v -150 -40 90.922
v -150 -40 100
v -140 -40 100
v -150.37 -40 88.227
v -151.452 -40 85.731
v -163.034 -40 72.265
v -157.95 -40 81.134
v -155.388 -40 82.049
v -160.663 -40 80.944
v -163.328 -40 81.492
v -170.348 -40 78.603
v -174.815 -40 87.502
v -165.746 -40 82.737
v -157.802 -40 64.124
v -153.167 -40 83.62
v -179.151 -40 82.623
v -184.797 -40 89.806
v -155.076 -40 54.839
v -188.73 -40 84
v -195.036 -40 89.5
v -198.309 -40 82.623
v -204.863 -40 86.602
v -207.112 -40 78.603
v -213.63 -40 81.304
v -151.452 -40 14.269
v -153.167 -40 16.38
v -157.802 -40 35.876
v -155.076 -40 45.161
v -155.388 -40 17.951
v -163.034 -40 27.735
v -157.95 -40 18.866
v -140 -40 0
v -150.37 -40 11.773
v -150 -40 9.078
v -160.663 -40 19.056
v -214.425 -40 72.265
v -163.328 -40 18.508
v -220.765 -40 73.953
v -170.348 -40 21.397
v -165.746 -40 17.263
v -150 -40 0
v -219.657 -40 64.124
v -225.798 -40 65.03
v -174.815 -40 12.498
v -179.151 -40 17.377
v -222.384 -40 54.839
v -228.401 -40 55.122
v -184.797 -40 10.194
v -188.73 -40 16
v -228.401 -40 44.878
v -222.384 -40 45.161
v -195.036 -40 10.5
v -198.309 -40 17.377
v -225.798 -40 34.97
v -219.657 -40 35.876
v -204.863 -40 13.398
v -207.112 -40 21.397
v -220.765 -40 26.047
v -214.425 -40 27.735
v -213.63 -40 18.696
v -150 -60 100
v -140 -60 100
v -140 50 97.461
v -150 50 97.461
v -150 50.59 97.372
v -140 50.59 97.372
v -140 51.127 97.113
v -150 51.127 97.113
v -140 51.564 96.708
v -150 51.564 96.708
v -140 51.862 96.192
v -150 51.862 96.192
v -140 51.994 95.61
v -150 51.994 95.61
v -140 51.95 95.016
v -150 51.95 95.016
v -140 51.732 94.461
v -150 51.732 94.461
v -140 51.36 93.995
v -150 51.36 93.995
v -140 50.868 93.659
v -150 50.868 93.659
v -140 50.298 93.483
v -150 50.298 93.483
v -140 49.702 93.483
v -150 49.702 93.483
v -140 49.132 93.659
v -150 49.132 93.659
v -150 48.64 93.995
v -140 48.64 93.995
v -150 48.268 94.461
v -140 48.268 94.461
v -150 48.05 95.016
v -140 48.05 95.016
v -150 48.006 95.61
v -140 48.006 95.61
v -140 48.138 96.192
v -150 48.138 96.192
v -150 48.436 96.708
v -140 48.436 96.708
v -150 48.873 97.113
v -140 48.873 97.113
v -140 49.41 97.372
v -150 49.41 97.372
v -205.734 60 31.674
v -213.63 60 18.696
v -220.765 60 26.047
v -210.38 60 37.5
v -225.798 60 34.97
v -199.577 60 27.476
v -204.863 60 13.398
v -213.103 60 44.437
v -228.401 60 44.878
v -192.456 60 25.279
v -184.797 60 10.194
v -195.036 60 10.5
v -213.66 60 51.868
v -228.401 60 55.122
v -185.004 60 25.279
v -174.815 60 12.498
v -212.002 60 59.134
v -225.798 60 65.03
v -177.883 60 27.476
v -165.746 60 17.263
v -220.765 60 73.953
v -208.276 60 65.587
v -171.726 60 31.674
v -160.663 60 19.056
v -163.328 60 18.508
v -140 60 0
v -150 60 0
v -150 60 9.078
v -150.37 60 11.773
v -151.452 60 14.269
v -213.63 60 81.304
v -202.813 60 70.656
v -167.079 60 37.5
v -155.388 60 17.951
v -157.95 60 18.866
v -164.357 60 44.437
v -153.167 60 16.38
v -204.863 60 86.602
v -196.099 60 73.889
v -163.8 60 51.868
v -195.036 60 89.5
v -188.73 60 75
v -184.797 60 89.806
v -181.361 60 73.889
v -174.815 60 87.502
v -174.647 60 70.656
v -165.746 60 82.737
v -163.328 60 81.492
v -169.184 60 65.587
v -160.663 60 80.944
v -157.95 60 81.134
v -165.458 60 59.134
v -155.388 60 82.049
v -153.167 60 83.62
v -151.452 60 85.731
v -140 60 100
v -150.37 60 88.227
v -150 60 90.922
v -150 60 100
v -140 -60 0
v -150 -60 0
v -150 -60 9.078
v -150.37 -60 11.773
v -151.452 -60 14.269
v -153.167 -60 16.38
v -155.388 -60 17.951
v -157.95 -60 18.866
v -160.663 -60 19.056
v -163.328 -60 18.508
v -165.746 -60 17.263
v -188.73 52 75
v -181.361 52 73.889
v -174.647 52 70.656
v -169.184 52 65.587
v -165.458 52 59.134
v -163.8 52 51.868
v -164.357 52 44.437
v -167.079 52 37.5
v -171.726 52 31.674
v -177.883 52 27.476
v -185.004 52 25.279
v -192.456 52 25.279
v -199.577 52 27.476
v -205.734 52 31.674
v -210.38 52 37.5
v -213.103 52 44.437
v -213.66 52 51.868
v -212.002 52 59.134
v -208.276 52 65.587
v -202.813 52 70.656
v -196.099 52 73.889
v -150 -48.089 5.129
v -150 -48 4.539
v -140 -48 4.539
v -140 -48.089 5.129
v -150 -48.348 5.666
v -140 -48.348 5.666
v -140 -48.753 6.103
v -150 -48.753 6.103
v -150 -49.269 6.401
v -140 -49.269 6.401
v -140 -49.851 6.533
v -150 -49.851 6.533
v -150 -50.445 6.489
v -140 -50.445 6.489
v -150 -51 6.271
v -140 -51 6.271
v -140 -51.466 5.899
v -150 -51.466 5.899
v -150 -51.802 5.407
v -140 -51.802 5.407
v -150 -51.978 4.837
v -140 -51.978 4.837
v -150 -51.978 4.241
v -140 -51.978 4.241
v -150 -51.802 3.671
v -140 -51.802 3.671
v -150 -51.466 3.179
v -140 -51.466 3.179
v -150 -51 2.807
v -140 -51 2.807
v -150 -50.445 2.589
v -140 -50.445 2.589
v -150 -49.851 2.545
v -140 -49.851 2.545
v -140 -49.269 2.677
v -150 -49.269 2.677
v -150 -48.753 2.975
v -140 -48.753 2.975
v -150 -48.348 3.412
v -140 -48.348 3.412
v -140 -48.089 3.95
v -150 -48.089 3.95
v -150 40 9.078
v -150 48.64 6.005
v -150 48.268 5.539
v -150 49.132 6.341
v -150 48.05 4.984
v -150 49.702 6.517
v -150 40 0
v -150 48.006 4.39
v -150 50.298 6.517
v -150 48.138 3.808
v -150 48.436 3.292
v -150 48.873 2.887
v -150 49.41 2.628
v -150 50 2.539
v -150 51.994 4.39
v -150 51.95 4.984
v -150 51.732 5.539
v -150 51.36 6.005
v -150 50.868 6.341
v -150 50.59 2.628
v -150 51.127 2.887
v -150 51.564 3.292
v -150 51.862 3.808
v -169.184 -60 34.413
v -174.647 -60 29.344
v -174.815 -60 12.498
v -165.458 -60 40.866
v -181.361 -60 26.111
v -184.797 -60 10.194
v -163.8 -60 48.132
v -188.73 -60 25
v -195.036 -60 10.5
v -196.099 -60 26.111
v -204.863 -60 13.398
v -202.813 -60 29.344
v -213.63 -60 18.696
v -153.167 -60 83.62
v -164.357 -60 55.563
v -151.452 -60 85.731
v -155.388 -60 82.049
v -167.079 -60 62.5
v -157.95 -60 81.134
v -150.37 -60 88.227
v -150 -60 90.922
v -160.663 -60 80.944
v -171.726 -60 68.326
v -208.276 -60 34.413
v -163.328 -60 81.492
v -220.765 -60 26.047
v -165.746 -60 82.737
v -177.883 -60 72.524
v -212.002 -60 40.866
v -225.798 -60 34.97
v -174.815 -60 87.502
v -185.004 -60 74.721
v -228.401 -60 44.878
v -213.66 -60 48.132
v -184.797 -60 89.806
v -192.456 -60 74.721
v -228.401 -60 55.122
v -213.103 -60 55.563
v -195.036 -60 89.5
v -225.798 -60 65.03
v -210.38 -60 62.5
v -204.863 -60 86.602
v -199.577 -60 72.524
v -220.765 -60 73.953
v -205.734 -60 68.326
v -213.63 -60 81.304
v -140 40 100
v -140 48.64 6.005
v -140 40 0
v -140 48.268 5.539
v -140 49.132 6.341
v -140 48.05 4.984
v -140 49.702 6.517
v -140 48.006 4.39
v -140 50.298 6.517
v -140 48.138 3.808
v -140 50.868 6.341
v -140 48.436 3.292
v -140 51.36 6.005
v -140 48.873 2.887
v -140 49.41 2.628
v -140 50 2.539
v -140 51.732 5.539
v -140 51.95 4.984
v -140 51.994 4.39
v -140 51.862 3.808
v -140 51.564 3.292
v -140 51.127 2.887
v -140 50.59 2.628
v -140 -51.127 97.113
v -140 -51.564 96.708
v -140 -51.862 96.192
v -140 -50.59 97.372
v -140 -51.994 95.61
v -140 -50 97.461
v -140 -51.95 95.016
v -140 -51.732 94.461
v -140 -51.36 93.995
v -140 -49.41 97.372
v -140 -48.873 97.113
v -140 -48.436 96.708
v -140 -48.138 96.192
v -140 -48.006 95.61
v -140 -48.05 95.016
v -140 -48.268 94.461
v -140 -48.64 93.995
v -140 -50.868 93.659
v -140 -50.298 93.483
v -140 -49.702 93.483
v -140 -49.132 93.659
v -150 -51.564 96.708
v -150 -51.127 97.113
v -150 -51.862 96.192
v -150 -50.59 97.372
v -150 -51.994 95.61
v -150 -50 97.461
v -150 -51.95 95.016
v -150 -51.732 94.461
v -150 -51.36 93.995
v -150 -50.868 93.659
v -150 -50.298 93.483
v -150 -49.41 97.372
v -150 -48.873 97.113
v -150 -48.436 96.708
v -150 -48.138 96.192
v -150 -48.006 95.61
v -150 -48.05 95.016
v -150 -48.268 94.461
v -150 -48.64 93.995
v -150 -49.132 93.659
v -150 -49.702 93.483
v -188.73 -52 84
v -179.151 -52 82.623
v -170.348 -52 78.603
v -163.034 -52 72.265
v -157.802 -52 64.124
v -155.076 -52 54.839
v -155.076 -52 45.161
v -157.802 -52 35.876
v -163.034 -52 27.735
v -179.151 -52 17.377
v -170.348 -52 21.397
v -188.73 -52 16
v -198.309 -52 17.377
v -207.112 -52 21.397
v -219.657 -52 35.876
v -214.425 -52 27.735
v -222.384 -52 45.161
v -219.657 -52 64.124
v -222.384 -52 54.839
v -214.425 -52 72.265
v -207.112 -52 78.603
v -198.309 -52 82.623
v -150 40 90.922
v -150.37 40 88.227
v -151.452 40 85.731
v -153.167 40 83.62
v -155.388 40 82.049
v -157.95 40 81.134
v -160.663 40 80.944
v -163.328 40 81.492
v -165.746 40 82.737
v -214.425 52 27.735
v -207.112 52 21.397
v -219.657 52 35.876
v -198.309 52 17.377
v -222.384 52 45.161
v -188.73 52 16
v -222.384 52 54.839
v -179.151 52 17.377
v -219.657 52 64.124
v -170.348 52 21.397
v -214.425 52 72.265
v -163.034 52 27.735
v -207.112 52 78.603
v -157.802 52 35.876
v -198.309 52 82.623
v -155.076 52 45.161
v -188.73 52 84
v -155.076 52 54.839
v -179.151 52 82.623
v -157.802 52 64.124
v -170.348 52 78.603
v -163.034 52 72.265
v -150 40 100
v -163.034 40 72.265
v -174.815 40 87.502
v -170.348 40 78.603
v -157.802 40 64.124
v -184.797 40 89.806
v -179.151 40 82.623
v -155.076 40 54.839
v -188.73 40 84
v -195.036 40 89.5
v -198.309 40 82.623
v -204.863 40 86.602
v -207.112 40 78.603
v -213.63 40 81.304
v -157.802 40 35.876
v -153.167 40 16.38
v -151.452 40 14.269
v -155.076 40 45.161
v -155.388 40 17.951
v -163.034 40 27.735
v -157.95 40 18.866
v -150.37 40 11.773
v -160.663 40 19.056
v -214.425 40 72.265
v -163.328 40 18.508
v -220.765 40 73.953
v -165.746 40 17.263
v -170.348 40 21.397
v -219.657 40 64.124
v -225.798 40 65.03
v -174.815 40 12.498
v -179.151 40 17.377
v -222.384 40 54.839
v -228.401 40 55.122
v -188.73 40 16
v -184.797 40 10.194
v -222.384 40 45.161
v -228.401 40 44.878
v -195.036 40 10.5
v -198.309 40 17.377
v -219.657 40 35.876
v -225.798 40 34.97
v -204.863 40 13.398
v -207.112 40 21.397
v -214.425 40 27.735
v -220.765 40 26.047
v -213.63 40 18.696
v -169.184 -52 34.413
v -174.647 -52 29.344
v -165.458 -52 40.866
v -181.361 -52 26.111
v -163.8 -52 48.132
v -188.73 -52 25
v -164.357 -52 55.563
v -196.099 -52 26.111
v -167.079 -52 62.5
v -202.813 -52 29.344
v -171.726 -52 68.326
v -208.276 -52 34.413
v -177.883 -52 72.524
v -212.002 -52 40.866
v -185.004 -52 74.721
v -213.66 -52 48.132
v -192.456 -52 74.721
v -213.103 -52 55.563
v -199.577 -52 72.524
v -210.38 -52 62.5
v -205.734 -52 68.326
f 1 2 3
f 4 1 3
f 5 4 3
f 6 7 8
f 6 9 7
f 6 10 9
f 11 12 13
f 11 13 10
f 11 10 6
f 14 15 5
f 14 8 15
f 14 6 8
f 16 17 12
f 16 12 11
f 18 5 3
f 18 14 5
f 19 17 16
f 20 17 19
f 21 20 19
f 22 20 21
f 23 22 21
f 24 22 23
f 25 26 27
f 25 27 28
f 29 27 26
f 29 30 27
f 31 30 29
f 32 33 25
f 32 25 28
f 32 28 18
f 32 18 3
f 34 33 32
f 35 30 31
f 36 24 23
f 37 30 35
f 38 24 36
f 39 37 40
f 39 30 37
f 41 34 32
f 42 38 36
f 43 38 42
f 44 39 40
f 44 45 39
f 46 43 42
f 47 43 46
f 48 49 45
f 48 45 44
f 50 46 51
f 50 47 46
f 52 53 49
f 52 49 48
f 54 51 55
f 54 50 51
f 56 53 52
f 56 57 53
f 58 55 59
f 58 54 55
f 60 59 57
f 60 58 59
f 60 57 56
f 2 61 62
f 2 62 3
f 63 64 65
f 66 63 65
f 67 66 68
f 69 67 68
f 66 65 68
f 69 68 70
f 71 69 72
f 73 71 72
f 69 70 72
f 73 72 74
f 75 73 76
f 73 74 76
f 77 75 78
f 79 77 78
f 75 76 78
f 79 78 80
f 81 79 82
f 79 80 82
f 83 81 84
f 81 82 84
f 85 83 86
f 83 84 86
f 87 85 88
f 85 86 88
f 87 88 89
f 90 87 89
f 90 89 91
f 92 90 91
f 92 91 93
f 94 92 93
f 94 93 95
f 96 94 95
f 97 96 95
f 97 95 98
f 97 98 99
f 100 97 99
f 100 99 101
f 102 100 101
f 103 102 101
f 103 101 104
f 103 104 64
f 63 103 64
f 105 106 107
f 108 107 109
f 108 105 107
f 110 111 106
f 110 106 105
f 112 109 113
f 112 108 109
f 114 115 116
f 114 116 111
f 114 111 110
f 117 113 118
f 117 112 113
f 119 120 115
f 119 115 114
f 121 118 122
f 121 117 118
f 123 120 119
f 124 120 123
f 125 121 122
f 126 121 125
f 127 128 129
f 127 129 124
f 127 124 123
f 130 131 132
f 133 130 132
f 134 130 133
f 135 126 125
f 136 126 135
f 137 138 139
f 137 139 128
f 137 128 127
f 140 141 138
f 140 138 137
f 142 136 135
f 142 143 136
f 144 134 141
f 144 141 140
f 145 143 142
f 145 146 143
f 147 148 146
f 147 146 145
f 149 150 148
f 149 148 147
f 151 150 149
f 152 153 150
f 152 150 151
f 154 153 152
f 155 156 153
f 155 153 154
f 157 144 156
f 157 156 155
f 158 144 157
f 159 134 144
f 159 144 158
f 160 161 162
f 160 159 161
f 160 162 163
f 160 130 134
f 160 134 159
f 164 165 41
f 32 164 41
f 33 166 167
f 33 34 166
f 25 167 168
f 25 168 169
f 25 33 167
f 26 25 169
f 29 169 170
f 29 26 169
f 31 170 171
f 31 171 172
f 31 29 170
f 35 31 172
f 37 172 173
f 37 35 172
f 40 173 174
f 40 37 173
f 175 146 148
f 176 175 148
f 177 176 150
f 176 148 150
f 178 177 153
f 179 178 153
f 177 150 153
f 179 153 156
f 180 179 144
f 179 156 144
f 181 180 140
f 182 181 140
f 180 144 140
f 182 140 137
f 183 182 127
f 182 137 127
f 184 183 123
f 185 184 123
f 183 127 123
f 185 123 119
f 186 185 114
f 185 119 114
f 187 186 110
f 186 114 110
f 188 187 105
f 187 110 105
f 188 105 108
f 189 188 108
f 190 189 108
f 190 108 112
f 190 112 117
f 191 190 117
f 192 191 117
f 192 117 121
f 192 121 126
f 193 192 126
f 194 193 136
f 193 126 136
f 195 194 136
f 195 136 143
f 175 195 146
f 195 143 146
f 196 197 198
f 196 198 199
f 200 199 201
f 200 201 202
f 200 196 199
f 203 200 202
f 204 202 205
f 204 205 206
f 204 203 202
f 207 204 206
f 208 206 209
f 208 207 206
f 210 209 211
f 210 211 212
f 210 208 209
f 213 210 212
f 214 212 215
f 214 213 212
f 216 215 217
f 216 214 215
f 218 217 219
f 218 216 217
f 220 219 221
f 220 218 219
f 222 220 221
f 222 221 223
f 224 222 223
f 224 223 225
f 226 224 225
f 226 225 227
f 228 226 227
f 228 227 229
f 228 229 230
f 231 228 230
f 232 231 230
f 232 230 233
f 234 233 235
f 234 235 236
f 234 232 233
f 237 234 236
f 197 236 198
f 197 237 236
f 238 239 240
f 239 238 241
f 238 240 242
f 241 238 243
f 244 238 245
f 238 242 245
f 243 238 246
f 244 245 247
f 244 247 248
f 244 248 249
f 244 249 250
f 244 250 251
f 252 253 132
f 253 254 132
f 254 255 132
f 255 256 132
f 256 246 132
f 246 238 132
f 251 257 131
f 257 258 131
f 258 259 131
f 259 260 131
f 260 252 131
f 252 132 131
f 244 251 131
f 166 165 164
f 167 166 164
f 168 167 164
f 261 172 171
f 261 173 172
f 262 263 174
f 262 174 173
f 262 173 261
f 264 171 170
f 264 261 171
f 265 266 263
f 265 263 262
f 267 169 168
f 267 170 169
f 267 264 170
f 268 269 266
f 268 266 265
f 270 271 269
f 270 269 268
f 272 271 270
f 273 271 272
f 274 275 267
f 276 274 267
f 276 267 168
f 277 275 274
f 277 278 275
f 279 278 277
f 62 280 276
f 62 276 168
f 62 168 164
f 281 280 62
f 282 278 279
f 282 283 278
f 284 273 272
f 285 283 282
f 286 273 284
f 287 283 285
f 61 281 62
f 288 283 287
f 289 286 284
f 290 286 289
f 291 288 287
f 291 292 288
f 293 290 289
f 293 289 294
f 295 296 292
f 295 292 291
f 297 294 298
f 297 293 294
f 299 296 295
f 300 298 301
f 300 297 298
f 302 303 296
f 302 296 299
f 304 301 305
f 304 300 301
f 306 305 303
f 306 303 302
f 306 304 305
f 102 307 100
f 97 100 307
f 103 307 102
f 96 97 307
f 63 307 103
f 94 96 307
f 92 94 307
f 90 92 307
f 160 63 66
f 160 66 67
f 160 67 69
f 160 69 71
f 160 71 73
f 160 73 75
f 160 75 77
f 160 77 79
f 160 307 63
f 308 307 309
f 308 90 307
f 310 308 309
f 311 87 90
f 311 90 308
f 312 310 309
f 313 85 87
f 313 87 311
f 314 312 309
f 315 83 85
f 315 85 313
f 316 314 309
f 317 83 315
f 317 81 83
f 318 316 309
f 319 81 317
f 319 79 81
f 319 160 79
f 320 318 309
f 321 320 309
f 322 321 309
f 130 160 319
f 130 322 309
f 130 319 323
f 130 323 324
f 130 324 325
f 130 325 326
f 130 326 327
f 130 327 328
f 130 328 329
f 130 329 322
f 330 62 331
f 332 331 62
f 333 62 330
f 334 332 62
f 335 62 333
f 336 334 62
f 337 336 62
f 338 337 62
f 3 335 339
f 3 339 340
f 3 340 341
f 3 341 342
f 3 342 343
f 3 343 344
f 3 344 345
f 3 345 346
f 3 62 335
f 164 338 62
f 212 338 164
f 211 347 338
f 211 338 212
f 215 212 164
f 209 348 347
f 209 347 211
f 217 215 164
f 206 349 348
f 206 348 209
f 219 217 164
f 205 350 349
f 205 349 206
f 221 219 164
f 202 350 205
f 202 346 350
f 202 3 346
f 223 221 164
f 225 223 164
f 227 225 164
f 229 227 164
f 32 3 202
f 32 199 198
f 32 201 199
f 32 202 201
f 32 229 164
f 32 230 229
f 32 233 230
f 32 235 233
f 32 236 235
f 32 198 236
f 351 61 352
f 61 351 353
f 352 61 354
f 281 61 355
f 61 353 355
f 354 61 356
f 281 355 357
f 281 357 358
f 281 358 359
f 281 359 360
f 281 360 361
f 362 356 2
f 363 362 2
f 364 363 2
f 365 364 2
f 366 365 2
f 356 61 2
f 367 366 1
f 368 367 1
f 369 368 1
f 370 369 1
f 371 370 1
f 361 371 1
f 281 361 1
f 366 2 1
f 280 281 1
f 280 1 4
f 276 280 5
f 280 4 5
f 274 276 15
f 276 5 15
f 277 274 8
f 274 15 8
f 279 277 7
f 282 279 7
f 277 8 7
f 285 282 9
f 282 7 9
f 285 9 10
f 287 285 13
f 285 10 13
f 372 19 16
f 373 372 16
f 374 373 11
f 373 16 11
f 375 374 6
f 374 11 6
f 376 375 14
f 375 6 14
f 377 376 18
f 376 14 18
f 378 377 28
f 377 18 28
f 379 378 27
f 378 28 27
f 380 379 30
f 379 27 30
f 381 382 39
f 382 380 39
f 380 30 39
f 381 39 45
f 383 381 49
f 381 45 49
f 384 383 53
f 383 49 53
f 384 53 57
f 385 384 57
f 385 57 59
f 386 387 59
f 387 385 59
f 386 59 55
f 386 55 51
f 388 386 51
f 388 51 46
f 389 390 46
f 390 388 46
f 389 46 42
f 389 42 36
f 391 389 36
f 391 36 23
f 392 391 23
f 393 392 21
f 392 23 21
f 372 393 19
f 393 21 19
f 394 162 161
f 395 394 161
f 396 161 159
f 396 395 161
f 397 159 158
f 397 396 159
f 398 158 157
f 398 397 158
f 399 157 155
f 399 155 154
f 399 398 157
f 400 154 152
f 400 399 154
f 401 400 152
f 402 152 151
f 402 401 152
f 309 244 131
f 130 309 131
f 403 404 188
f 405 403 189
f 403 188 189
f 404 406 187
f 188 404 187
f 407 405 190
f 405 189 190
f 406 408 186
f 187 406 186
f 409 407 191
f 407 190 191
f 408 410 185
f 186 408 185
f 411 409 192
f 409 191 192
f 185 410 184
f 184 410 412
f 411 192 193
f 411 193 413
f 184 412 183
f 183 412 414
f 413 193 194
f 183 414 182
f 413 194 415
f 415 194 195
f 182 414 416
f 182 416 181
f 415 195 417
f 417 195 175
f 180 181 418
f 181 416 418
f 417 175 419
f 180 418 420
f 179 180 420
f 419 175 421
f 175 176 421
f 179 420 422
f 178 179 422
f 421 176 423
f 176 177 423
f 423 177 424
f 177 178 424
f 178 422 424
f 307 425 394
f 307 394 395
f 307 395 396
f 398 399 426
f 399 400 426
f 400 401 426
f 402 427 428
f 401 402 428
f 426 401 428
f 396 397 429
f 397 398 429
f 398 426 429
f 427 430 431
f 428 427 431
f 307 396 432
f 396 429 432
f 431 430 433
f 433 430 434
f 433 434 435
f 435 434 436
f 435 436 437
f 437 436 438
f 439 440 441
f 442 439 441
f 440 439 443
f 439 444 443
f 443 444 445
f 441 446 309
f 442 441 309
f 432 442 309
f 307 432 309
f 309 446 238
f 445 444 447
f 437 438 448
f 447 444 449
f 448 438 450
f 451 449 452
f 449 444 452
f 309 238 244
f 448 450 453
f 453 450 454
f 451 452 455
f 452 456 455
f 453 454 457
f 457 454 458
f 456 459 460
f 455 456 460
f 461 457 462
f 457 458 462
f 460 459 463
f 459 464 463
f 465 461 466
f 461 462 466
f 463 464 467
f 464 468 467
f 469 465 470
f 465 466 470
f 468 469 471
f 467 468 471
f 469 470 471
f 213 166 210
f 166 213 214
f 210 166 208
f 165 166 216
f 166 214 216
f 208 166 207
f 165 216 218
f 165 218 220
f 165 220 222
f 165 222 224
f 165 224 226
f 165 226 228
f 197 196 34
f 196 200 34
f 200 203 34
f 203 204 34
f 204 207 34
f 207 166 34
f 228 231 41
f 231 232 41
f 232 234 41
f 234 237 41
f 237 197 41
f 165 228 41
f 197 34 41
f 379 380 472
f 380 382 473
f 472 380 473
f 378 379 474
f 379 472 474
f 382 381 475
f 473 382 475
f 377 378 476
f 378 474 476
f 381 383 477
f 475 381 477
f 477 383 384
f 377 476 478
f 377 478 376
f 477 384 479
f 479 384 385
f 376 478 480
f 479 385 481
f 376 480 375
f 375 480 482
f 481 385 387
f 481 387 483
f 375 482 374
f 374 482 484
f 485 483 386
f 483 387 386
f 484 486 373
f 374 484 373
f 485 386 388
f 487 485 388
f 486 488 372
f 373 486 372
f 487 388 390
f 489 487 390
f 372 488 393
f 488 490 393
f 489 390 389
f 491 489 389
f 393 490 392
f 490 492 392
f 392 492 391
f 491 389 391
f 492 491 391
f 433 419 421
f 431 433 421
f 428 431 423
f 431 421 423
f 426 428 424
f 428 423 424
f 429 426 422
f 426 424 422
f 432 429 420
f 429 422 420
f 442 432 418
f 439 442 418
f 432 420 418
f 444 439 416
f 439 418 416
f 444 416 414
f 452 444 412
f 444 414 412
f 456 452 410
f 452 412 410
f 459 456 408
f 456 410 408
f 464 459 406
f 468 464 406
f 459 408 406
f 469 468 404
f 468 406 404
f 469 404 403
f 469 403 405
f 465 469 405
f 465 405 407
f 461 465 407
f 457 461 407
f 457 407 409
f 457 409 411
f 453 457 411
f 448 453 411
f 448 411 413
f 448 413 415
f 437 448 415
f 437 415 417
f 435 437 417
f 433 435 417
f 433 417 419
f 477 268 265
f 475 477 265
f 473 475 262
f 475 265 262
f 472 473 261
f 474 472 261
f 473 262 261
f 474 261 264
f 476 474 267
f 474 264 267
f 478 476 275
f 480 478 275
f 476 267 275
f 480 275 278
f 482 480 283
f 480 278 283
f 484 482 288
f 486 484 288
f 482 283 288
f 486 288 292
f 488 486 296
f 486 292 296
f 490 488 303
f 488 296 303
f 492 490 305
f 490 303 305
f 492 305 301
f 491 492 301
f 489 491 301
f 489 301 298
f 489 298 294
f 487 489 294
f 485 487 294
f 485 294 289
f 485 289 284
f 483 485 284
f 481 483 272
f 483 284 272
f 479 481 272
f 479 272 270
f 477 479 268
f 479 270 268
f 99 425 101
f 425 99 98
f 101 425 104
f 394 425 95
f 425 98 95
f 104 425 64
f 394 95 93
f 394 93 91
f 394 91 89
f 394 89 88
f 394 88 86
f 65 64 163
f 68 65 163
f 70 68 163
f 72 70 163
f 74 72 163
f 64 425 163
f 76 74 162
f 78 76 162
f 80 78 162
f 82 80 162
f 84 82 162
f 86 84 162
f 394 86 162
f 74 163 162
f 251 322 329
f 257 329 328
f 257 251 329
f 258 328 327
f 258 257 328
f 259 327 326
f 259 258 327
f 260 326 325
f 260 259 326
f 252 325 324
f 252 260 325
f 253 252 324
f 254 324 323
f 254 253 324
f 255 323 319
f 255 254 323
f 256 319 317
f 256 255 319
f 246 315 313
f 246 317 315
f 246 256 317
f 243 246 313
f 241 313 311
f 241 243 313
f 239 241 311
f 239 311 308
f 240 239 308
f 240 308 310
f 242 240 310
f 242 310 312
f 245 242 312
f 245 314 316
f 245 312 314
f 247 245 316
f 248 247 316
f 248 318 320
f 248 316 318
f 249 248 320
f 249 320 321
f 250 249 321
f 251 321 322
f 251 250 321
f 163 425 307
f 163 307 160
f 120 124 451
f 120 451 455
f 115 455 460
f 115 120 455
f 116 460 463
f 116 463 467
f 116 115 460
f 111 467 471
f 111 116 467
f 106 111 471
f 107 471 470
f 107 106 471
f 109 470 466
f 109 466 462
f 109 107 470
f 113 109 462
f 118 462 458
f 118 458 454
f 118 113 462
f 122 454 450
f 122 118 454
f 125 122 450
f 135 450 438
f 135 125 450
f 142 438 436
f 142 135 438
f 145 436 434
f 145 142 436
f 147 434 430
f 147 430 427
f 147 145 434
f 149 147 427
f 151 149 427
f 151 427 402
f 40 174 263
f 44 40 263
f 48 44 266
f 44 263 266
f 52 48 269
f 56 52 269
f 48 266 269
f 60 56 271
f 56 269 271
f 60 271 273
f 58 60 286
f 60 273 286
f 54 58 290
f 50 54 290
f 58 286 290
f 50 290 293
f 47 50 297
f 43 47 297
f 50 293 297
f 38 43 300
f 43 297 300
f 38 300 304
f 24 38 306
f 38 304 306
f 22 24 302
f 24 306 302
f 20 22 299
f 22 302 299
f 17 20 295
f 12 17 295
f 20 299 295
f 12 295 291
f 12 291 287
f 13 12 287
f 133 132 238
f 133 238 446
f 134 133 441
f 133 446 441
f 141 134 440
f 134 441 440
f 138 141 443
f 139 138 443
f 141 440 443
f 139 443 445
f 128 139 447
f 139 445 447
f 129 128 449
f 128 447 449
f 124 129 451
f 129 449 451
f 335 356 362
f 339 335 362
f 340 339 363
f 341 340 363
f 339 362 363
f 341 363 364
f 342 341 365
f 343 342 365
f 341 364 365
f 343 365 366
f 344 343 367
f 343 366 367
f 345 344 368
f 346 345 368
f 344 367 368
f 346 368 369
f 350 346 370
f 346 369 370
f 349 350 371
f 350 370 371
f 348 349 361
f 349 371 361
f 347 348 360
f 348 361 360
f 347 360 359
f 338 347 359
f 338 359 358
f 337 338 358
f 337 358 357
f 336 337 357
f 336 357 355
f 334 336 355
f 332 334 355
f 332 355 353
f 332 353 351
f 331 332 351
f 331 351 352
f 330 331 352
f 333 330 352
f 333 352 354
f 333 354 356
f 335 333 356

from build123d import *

# Parameters (mm, degrees)
SKETCH_1_W                                = 300
SKETCH_1_H                                = 120
EXTRUDE_1_DEPTH                           = 100
EXTRUDE_2_DEPTH                           = 20
FILLET_2_R                                = 10
FILLET_3_R                                = 10
MIRROR_6_AT_THE_SECOND_PLANE_COPY_1_DEPTH = 20
FILLET_10_R                               = 10
FILLET_11_R                               = 10
FILLET_12_R                               = 10
FILLET_13_R                               = 10
FILLET_14_R                               = 10
FILLET_15_R                               = 10
CUT_EXTRUDE_1_REACH                       = 258.744
PATTERN_LINEAR_1_COUNT                    = 4
PATTERN_LINEAR_1_PITCH                    = 40
PATTERN_LINEAR_1_COL_COUNT                = 4
PATTERN_LINEAR_1_COL_PITCH                = 40
SKETCH_4_R                                = 30
EXTRUDE_3_DEPTH                           = 14
SKETCH_6_R                                = 34
CUT_EXTRUDE_2_DEPTH                       = 284.325496056
FILLET_16_R                               = 5
CUT_EXTRUDE_3_REACH                       = 276.433
SKETCH_7_R                                = 2
PATTERN_CIRCULAR_1_COUNT                  = 6
SKETCH_8_W                                = 104.728180427
SKETCH_8_H                                = 147.280084006
CUT_EXTRUDE_4_DEPTH                       = 399.638039773
SKETCH_9_W                                = 100
SKETCH_9_H                                = 20
EXTRUDE_4_DEPTH                           = 10
SKETCH_10_W                               = 100
SKETCH_10_H                               = 20
EXTRUDE_5_DEPTH                           = 10
SKETCH_11_R                               = 2
CUT_EXTRUDE_5_DEPTH                       = 141.706739984
MIRROR_START                              = -150
MIRROR_8_OUTLINE_R                        = 2
MIRROR_8_DEPTH                            = 10
SKETCH_12_R                               = 2
CUT_EXTRUDE_6_DEPTH                       = 141.706739984
SKETCH_14_R                               = 34
SKETCH_14_R_2                             = 25
EXTRUDE_6_DEPTH                           = 8
SKETCH_15_R                               = 34
SKETCH_15_R_2                             = 25
EXTRUDE_7_DEPTH                           = 8


# Read off the part's stored shape, not the designer's step: 镜向8
with BuildPart() as part:
    # 草图1 → 凸台-拉伸1 (new body)
    with BuildSketch(Plane.XY):
        Rectangle(SKETCH_1_W, SKETCH_1_H)
    extrude(amount=EXTRUDE_1_DEPTH)

    # 草图2 → 凸台-拉伸2 (add)
    with BuildSketch(Plane(origin=(0, 60, 0), x_dir=(1, 0, 0), z_dir=(0, 1, 0))):
        with BuildLine():
            Line((150, -50), (150, -40))
            ThreePointArc((150, -40), (228.729833462, -50), (150, -60))
            Line((150, -60), (150, -50))
        make_face()
    extrude_2 = extrude(amount=-EXTRUDE_2_DEPTH)

    # 圆角2
    fillet_2_edges = [part.edges().sort_by_distance(p)[0] for p in [
        (150, 50, 40),
    ]]
    fillet(fillet_2_edges, radius=FILLET_2_R)

    # 圆角3
    fillet_3_edges = [part.edges().sort_by_distance(p)[0] for p in [
        (150, 50, 60),
    ]]
    fillet(fillet_3_edges, radius=FILLET_3_R)

    # 镜向6: 凸台-拉伸2 across plane
    add(extrude_2.mirror(Plane(origin=(0, 0, 0), x_dir=(0, 0, 1), z_dir=(1, 0, 0))))

    # 镜向6 at the second plane: 凸台-拉伸2 across plane
    add(extrude_2.mirror(Plane.ZX))

    # 镜向6 at the second plane copy 1 sket → 镜向6 at the second plane copy 1 (add)
    with BuildSketch(Plane(origin=(0, -60, 0), x_dir=(-1, 0, 0), z_dir=(0, -1, 0))):
        with BuildLine():
            Line((150, -50), (150, -40))
            ThreePointArc((150, -40), (228.729833462, -50), (150, -60))
            Line((150, -60), (150, -50))
        make_face()
    extrude(amount=-MIRROR_6_AT_THE_SECOND_PLANE_COPY_1_DEPTH)

    # 圆角10
    fillet_10_edges = [part.edges().sort_by_distance(p)[0] for p in [
        (150, -50, 60),
    ]]
    fillet(fillet_10_edges, radius=FILLET_10_R)

    # 圆角11
    fillet_11_edges = [part.edges().sort_by_distance(p)[0] for p in [
        (150, -50, 40),
    ]]
    fillet(fillet_11_edges, radius=FILLET_11_R)

    # 圆角12
    fillet_12_edges = [part.edges().sort_by_distance(p)[0] for p in [
        (-150, 50, 40),
    ]]
    fillet(fillet_12_edges, radius=FILLET_12_R)

    # 圆角13
    fillet_13_edges = [part.edges().sort_by_distance(p)[0] for p in [
        (-150, -50, 60),
    ]]
    fillet(fillet_13_edges, radius=FILLET_13_R)

    # 圆角14
    fillet_14_edges = [part.edges().sort_by_distance(p)[0] for p in [
        (-150, 50, 60),
    ]]
    fillet(fillet_14_edges, radius=FILLET_14_R)

    # 圆角15
    fillet_15_edges = [part.edges().sort_by_distance(p)[0] for p in [
        (-150, -50, 40),
    ]]
    fillet(fillet_15_edges, radius=FILLET_15_R)

    # 草图3 → 切除-拉伸1 (cut, up to next)
    with BuildSketch(Plane.XY.offset(100), mode=Mode.PRIVATE) as cut_extrude_1_sk1:
        with BuildLine():
            Line((-11.916195323, -32.511613), (-11.916195323, 32.511613))
            ThreePointArc((-11.916195323, 32.511613), (0, 44.427808323), (11.916195323, 32.511613))
            Line((11.916195323, 32.511613), (11.916195323, -32.511613))
            ThreePointArc((11.916195323, -32.511613), (0, -44.427808323), (-11.916195323, -32.511613))
        make_face()
    cut_extrude_1_tool1 = extrude(cut_extrude_1_sk1.sketch, amount=-CUT_EXTRUDE_1_REACH, mode=Mode.PRIVATE) & part.part
    cut_extrude_1 = cut_extrude_1_tool1.solids().sort_by_distance((0, 0, 100))[0]
    add(cut_extrude_1, mode=Mode.SUBTRACT)

    # 阵列(线性)1: 切除-拉伸1 ×4
    with Locations(*[(i * PATTERN_LINEAR_1_PITCH, 0, 0) for i in range(1, PATTERN_LINEAR_1_COUNT)]):
        add(cut_extrude_1, mode=Mode.SUBTRACT)

    # 阵列(线性)1 col: 切除-拉伸1 ×4
    with Locations(*[(-i * PATTERN_LINEAR_1_COL_PITCH, 0, 0) for i in range(1, PATTERN_LINEAR_1_COL_COUNT)]):
        add(cut_extrude_1, mode=Mode.SUBTRACT)

    # 草图4 → 凸台-拉伸3 (add)
    with BuildSketch(Plane.XZ.offset(60)):
        with Locations(Location((188.729833462, 50, 0), (0, 0, 90))):
            Circle(SKETCH_4_R)
    extrude(amount=EXTRUDE_3_DEPTH)

    # 草图6 → 切除-拉伸2 (cut, through all)
    with BuildSketch(Plane(origin=(0, 60, 0), x_dir=(1, 0, 0), z_dir=(0, 1, 0))):
        with Locations(Location((-188.729833462, -50, 0), (0, 0, 270))):
            Circle(SKETCH_6_R)
    extrude(amount=-CUT_EXTRUDE_2_DEPTH, mode=Mode.SUBTRACT)

    # 圆角16
    fillet_16_edges = [part.edges().sort_by_distance(p)[0] for p in [
        (-150, 0, 100),
        (0, -60, 100),
        (150, 0, 100),
        (0, -60, 0),
        (-150, 0, 0),
        (0, 60, 0),
        (150, 0, 0),
        (0, 60, 100),
    ]]
    fillet(fillet_16_edges, radius=FILLET_16_R)

    # 草图7 → 切除-拉伸3 (cut, up to next)
    with BuildSketch(Plane.XZ.offset(-40), mode=Mode.PRIVATE) as cut_extrude_3_sk1:
        with Locations(Location((188.729833462, 84.5, 0), (0, 0, 270))):
            Circle(SKETCH_7_R)
    cut_extrude_3_tool1 = extrude(cut_extrude_3_sk1.sketch, amount=-CUT_EXTRUDE_3_REACH, mode=Mode.PRIVATE) & part.part
    cut_extrude_3 = cut_extrude_3_tool1.solids().sort_by_distance((188.729833, 40, 84.5))[0]
    add(cut_extrude_3, mode=Mode.SUBTRACT)

    # 阵列(圆周)1: 切除-拉伸3 ×6 about axis
    pattern_circular_1_axis = Axis((188.729833462, 0, 50), (0, 1, 0))
    for i in range(1, PATTERN_CIRCULAR_1_COUNT):
        add(cut_extrude_3.rotate(pattern_circular_1_axis, i * 360 / PATTERN_CIRCULAR_1_COUNT), mode=Mode.SUBTRACT)

    # 草图8 → 切除-拉伸4 (cut, through all)
    with BuildSketch(Plane.ZY.offset(150)):
        with Locations((52.364090214, -7.105652858)):
            Rectangle(SKETCH_8_W, SKETCH_8_H)
    extrude(amount=-CUT_EXTRUDE_4_DEPTH, mode=Mode.SUBTRACT)


with BuildPart() as cut_extrude_4_piece_1:
    # of the separate pieces the step leaves, piece 1, a body of its own (cut_extrude_4_pieces)
    add(part.part.solids().sort_by_distance((-150, -60, 9.078163907))[0])

    # 草图10 → 凸台-拉伸5 (add)
    with BuildSketch(Plane(origin=(-150, 0, 0), x_dir=(0, 0, -1), z_dir=(1, 0, 0))):
        with Locations((-50, -50)):
            Rectangle(SKETCH_10_W, SKETCH_10_H)
    extrude(amount=EXTRUDE_5_DEPTH)

    # 草图11 → 切除-拉伸5 (cut, through all)
    with BuildSketch(Plane.ZY.offset(150)):
        with Locations((95.460918047, -50)):
            Circle(SKETCH_11_R)
    extrude(amount=-CUT_EXTRUDE_5_DEPTH, mode=Mode.SUBTRACT)

    # 镜向8 outline → 镜向8 (cut)
    with BuildSketch(Plane.YZ.offset(MIRROR_START)):
        with Locations((-50, 4.539081953)):
            Circle(MIRROR_8_OUTLINE_R)
    extrude(amount=MIRROR_8_DEPTH, mode=Mode.SUBTRACT)

    # 草图14 → 凸台-拉伸6 (add)
    with BuildSketch(Plane(origin=(0, -60, 0), x_dir=(-1, 0, 0), z_dir=(0, -1, 0))):
        with Locations(Location((188.729833462, -50, 0), (0, 0, 270))):
            Circle(SKETCH_14_R)
        with Locations(Location((188.729833462, -50, 0), (0, 0, 90))):
            Circle(SKETCH_14_R_2, mode=Mode.SUBTRACT)
    extrude(amount=-EXTRUDE_6_DEPTH)


with BuildPart() as cut_extrude_4_piece_2:
    # of the separate pieces the step leaves, piece 2, a body of its own (cut_extrude_4_pieces)
    add(part.part.solids().sort_by_distance((-150, 60, 9.078163907))[0])

    # 草图9 → 凸台-拉伸4 (add)
    with BuildSketch(Plane(origin=(-150, 0, 0), x_dir=(0, 0, -1), z_dir=(1, 0, 0))):
        with Locations((-50, 50)):
            Rectangle(SKETCH_9_W, SKETCH_9_H)
    extrude(amount=EXTRUDE_4_DEPTH)

    # 草图12 → 切除-拉伸6 (cut, through all)
    with BuildSketch(Plane.ZY.offset(150)):
        with Locations((95.460918047, 50)):
            Circle(SKETCH_12_R)
    cut_extrude_6 = extrude(amount=-CUT_EXTRUDE_6_DEPTH, mode=Mode.SUBTRACT)

    # 镜向10: 切除-拉伸6 across plane
    add(cut_extrude_6.mirror(Plane.XY.offset(50)), mode=Mode.SUBTRACT)

    # 草图15 → 凸台-拉伸7 (add)
    with BuildSketch(Plane(origin=(0, 60, 0), x_dir=(1, 0, 0), z_dir=(0, 1, 0))):
        with Locations(Location((-188.729833462, -50, 0), (0, 0, 270))):
            Circle(SKETCH_15_R)
        with Locations(Location((-188.729833462, -50, 0), (0, 0, 270))):
            Circle(SKETCH_15_R_2, mode=Mode.SUBTRACT)
    extrude(amount=-EXTRUDE_7_DEPTH)


solid = Compound([cut_extrude_4_piece_1.part, cut_extrude_4_piece_2.part])
